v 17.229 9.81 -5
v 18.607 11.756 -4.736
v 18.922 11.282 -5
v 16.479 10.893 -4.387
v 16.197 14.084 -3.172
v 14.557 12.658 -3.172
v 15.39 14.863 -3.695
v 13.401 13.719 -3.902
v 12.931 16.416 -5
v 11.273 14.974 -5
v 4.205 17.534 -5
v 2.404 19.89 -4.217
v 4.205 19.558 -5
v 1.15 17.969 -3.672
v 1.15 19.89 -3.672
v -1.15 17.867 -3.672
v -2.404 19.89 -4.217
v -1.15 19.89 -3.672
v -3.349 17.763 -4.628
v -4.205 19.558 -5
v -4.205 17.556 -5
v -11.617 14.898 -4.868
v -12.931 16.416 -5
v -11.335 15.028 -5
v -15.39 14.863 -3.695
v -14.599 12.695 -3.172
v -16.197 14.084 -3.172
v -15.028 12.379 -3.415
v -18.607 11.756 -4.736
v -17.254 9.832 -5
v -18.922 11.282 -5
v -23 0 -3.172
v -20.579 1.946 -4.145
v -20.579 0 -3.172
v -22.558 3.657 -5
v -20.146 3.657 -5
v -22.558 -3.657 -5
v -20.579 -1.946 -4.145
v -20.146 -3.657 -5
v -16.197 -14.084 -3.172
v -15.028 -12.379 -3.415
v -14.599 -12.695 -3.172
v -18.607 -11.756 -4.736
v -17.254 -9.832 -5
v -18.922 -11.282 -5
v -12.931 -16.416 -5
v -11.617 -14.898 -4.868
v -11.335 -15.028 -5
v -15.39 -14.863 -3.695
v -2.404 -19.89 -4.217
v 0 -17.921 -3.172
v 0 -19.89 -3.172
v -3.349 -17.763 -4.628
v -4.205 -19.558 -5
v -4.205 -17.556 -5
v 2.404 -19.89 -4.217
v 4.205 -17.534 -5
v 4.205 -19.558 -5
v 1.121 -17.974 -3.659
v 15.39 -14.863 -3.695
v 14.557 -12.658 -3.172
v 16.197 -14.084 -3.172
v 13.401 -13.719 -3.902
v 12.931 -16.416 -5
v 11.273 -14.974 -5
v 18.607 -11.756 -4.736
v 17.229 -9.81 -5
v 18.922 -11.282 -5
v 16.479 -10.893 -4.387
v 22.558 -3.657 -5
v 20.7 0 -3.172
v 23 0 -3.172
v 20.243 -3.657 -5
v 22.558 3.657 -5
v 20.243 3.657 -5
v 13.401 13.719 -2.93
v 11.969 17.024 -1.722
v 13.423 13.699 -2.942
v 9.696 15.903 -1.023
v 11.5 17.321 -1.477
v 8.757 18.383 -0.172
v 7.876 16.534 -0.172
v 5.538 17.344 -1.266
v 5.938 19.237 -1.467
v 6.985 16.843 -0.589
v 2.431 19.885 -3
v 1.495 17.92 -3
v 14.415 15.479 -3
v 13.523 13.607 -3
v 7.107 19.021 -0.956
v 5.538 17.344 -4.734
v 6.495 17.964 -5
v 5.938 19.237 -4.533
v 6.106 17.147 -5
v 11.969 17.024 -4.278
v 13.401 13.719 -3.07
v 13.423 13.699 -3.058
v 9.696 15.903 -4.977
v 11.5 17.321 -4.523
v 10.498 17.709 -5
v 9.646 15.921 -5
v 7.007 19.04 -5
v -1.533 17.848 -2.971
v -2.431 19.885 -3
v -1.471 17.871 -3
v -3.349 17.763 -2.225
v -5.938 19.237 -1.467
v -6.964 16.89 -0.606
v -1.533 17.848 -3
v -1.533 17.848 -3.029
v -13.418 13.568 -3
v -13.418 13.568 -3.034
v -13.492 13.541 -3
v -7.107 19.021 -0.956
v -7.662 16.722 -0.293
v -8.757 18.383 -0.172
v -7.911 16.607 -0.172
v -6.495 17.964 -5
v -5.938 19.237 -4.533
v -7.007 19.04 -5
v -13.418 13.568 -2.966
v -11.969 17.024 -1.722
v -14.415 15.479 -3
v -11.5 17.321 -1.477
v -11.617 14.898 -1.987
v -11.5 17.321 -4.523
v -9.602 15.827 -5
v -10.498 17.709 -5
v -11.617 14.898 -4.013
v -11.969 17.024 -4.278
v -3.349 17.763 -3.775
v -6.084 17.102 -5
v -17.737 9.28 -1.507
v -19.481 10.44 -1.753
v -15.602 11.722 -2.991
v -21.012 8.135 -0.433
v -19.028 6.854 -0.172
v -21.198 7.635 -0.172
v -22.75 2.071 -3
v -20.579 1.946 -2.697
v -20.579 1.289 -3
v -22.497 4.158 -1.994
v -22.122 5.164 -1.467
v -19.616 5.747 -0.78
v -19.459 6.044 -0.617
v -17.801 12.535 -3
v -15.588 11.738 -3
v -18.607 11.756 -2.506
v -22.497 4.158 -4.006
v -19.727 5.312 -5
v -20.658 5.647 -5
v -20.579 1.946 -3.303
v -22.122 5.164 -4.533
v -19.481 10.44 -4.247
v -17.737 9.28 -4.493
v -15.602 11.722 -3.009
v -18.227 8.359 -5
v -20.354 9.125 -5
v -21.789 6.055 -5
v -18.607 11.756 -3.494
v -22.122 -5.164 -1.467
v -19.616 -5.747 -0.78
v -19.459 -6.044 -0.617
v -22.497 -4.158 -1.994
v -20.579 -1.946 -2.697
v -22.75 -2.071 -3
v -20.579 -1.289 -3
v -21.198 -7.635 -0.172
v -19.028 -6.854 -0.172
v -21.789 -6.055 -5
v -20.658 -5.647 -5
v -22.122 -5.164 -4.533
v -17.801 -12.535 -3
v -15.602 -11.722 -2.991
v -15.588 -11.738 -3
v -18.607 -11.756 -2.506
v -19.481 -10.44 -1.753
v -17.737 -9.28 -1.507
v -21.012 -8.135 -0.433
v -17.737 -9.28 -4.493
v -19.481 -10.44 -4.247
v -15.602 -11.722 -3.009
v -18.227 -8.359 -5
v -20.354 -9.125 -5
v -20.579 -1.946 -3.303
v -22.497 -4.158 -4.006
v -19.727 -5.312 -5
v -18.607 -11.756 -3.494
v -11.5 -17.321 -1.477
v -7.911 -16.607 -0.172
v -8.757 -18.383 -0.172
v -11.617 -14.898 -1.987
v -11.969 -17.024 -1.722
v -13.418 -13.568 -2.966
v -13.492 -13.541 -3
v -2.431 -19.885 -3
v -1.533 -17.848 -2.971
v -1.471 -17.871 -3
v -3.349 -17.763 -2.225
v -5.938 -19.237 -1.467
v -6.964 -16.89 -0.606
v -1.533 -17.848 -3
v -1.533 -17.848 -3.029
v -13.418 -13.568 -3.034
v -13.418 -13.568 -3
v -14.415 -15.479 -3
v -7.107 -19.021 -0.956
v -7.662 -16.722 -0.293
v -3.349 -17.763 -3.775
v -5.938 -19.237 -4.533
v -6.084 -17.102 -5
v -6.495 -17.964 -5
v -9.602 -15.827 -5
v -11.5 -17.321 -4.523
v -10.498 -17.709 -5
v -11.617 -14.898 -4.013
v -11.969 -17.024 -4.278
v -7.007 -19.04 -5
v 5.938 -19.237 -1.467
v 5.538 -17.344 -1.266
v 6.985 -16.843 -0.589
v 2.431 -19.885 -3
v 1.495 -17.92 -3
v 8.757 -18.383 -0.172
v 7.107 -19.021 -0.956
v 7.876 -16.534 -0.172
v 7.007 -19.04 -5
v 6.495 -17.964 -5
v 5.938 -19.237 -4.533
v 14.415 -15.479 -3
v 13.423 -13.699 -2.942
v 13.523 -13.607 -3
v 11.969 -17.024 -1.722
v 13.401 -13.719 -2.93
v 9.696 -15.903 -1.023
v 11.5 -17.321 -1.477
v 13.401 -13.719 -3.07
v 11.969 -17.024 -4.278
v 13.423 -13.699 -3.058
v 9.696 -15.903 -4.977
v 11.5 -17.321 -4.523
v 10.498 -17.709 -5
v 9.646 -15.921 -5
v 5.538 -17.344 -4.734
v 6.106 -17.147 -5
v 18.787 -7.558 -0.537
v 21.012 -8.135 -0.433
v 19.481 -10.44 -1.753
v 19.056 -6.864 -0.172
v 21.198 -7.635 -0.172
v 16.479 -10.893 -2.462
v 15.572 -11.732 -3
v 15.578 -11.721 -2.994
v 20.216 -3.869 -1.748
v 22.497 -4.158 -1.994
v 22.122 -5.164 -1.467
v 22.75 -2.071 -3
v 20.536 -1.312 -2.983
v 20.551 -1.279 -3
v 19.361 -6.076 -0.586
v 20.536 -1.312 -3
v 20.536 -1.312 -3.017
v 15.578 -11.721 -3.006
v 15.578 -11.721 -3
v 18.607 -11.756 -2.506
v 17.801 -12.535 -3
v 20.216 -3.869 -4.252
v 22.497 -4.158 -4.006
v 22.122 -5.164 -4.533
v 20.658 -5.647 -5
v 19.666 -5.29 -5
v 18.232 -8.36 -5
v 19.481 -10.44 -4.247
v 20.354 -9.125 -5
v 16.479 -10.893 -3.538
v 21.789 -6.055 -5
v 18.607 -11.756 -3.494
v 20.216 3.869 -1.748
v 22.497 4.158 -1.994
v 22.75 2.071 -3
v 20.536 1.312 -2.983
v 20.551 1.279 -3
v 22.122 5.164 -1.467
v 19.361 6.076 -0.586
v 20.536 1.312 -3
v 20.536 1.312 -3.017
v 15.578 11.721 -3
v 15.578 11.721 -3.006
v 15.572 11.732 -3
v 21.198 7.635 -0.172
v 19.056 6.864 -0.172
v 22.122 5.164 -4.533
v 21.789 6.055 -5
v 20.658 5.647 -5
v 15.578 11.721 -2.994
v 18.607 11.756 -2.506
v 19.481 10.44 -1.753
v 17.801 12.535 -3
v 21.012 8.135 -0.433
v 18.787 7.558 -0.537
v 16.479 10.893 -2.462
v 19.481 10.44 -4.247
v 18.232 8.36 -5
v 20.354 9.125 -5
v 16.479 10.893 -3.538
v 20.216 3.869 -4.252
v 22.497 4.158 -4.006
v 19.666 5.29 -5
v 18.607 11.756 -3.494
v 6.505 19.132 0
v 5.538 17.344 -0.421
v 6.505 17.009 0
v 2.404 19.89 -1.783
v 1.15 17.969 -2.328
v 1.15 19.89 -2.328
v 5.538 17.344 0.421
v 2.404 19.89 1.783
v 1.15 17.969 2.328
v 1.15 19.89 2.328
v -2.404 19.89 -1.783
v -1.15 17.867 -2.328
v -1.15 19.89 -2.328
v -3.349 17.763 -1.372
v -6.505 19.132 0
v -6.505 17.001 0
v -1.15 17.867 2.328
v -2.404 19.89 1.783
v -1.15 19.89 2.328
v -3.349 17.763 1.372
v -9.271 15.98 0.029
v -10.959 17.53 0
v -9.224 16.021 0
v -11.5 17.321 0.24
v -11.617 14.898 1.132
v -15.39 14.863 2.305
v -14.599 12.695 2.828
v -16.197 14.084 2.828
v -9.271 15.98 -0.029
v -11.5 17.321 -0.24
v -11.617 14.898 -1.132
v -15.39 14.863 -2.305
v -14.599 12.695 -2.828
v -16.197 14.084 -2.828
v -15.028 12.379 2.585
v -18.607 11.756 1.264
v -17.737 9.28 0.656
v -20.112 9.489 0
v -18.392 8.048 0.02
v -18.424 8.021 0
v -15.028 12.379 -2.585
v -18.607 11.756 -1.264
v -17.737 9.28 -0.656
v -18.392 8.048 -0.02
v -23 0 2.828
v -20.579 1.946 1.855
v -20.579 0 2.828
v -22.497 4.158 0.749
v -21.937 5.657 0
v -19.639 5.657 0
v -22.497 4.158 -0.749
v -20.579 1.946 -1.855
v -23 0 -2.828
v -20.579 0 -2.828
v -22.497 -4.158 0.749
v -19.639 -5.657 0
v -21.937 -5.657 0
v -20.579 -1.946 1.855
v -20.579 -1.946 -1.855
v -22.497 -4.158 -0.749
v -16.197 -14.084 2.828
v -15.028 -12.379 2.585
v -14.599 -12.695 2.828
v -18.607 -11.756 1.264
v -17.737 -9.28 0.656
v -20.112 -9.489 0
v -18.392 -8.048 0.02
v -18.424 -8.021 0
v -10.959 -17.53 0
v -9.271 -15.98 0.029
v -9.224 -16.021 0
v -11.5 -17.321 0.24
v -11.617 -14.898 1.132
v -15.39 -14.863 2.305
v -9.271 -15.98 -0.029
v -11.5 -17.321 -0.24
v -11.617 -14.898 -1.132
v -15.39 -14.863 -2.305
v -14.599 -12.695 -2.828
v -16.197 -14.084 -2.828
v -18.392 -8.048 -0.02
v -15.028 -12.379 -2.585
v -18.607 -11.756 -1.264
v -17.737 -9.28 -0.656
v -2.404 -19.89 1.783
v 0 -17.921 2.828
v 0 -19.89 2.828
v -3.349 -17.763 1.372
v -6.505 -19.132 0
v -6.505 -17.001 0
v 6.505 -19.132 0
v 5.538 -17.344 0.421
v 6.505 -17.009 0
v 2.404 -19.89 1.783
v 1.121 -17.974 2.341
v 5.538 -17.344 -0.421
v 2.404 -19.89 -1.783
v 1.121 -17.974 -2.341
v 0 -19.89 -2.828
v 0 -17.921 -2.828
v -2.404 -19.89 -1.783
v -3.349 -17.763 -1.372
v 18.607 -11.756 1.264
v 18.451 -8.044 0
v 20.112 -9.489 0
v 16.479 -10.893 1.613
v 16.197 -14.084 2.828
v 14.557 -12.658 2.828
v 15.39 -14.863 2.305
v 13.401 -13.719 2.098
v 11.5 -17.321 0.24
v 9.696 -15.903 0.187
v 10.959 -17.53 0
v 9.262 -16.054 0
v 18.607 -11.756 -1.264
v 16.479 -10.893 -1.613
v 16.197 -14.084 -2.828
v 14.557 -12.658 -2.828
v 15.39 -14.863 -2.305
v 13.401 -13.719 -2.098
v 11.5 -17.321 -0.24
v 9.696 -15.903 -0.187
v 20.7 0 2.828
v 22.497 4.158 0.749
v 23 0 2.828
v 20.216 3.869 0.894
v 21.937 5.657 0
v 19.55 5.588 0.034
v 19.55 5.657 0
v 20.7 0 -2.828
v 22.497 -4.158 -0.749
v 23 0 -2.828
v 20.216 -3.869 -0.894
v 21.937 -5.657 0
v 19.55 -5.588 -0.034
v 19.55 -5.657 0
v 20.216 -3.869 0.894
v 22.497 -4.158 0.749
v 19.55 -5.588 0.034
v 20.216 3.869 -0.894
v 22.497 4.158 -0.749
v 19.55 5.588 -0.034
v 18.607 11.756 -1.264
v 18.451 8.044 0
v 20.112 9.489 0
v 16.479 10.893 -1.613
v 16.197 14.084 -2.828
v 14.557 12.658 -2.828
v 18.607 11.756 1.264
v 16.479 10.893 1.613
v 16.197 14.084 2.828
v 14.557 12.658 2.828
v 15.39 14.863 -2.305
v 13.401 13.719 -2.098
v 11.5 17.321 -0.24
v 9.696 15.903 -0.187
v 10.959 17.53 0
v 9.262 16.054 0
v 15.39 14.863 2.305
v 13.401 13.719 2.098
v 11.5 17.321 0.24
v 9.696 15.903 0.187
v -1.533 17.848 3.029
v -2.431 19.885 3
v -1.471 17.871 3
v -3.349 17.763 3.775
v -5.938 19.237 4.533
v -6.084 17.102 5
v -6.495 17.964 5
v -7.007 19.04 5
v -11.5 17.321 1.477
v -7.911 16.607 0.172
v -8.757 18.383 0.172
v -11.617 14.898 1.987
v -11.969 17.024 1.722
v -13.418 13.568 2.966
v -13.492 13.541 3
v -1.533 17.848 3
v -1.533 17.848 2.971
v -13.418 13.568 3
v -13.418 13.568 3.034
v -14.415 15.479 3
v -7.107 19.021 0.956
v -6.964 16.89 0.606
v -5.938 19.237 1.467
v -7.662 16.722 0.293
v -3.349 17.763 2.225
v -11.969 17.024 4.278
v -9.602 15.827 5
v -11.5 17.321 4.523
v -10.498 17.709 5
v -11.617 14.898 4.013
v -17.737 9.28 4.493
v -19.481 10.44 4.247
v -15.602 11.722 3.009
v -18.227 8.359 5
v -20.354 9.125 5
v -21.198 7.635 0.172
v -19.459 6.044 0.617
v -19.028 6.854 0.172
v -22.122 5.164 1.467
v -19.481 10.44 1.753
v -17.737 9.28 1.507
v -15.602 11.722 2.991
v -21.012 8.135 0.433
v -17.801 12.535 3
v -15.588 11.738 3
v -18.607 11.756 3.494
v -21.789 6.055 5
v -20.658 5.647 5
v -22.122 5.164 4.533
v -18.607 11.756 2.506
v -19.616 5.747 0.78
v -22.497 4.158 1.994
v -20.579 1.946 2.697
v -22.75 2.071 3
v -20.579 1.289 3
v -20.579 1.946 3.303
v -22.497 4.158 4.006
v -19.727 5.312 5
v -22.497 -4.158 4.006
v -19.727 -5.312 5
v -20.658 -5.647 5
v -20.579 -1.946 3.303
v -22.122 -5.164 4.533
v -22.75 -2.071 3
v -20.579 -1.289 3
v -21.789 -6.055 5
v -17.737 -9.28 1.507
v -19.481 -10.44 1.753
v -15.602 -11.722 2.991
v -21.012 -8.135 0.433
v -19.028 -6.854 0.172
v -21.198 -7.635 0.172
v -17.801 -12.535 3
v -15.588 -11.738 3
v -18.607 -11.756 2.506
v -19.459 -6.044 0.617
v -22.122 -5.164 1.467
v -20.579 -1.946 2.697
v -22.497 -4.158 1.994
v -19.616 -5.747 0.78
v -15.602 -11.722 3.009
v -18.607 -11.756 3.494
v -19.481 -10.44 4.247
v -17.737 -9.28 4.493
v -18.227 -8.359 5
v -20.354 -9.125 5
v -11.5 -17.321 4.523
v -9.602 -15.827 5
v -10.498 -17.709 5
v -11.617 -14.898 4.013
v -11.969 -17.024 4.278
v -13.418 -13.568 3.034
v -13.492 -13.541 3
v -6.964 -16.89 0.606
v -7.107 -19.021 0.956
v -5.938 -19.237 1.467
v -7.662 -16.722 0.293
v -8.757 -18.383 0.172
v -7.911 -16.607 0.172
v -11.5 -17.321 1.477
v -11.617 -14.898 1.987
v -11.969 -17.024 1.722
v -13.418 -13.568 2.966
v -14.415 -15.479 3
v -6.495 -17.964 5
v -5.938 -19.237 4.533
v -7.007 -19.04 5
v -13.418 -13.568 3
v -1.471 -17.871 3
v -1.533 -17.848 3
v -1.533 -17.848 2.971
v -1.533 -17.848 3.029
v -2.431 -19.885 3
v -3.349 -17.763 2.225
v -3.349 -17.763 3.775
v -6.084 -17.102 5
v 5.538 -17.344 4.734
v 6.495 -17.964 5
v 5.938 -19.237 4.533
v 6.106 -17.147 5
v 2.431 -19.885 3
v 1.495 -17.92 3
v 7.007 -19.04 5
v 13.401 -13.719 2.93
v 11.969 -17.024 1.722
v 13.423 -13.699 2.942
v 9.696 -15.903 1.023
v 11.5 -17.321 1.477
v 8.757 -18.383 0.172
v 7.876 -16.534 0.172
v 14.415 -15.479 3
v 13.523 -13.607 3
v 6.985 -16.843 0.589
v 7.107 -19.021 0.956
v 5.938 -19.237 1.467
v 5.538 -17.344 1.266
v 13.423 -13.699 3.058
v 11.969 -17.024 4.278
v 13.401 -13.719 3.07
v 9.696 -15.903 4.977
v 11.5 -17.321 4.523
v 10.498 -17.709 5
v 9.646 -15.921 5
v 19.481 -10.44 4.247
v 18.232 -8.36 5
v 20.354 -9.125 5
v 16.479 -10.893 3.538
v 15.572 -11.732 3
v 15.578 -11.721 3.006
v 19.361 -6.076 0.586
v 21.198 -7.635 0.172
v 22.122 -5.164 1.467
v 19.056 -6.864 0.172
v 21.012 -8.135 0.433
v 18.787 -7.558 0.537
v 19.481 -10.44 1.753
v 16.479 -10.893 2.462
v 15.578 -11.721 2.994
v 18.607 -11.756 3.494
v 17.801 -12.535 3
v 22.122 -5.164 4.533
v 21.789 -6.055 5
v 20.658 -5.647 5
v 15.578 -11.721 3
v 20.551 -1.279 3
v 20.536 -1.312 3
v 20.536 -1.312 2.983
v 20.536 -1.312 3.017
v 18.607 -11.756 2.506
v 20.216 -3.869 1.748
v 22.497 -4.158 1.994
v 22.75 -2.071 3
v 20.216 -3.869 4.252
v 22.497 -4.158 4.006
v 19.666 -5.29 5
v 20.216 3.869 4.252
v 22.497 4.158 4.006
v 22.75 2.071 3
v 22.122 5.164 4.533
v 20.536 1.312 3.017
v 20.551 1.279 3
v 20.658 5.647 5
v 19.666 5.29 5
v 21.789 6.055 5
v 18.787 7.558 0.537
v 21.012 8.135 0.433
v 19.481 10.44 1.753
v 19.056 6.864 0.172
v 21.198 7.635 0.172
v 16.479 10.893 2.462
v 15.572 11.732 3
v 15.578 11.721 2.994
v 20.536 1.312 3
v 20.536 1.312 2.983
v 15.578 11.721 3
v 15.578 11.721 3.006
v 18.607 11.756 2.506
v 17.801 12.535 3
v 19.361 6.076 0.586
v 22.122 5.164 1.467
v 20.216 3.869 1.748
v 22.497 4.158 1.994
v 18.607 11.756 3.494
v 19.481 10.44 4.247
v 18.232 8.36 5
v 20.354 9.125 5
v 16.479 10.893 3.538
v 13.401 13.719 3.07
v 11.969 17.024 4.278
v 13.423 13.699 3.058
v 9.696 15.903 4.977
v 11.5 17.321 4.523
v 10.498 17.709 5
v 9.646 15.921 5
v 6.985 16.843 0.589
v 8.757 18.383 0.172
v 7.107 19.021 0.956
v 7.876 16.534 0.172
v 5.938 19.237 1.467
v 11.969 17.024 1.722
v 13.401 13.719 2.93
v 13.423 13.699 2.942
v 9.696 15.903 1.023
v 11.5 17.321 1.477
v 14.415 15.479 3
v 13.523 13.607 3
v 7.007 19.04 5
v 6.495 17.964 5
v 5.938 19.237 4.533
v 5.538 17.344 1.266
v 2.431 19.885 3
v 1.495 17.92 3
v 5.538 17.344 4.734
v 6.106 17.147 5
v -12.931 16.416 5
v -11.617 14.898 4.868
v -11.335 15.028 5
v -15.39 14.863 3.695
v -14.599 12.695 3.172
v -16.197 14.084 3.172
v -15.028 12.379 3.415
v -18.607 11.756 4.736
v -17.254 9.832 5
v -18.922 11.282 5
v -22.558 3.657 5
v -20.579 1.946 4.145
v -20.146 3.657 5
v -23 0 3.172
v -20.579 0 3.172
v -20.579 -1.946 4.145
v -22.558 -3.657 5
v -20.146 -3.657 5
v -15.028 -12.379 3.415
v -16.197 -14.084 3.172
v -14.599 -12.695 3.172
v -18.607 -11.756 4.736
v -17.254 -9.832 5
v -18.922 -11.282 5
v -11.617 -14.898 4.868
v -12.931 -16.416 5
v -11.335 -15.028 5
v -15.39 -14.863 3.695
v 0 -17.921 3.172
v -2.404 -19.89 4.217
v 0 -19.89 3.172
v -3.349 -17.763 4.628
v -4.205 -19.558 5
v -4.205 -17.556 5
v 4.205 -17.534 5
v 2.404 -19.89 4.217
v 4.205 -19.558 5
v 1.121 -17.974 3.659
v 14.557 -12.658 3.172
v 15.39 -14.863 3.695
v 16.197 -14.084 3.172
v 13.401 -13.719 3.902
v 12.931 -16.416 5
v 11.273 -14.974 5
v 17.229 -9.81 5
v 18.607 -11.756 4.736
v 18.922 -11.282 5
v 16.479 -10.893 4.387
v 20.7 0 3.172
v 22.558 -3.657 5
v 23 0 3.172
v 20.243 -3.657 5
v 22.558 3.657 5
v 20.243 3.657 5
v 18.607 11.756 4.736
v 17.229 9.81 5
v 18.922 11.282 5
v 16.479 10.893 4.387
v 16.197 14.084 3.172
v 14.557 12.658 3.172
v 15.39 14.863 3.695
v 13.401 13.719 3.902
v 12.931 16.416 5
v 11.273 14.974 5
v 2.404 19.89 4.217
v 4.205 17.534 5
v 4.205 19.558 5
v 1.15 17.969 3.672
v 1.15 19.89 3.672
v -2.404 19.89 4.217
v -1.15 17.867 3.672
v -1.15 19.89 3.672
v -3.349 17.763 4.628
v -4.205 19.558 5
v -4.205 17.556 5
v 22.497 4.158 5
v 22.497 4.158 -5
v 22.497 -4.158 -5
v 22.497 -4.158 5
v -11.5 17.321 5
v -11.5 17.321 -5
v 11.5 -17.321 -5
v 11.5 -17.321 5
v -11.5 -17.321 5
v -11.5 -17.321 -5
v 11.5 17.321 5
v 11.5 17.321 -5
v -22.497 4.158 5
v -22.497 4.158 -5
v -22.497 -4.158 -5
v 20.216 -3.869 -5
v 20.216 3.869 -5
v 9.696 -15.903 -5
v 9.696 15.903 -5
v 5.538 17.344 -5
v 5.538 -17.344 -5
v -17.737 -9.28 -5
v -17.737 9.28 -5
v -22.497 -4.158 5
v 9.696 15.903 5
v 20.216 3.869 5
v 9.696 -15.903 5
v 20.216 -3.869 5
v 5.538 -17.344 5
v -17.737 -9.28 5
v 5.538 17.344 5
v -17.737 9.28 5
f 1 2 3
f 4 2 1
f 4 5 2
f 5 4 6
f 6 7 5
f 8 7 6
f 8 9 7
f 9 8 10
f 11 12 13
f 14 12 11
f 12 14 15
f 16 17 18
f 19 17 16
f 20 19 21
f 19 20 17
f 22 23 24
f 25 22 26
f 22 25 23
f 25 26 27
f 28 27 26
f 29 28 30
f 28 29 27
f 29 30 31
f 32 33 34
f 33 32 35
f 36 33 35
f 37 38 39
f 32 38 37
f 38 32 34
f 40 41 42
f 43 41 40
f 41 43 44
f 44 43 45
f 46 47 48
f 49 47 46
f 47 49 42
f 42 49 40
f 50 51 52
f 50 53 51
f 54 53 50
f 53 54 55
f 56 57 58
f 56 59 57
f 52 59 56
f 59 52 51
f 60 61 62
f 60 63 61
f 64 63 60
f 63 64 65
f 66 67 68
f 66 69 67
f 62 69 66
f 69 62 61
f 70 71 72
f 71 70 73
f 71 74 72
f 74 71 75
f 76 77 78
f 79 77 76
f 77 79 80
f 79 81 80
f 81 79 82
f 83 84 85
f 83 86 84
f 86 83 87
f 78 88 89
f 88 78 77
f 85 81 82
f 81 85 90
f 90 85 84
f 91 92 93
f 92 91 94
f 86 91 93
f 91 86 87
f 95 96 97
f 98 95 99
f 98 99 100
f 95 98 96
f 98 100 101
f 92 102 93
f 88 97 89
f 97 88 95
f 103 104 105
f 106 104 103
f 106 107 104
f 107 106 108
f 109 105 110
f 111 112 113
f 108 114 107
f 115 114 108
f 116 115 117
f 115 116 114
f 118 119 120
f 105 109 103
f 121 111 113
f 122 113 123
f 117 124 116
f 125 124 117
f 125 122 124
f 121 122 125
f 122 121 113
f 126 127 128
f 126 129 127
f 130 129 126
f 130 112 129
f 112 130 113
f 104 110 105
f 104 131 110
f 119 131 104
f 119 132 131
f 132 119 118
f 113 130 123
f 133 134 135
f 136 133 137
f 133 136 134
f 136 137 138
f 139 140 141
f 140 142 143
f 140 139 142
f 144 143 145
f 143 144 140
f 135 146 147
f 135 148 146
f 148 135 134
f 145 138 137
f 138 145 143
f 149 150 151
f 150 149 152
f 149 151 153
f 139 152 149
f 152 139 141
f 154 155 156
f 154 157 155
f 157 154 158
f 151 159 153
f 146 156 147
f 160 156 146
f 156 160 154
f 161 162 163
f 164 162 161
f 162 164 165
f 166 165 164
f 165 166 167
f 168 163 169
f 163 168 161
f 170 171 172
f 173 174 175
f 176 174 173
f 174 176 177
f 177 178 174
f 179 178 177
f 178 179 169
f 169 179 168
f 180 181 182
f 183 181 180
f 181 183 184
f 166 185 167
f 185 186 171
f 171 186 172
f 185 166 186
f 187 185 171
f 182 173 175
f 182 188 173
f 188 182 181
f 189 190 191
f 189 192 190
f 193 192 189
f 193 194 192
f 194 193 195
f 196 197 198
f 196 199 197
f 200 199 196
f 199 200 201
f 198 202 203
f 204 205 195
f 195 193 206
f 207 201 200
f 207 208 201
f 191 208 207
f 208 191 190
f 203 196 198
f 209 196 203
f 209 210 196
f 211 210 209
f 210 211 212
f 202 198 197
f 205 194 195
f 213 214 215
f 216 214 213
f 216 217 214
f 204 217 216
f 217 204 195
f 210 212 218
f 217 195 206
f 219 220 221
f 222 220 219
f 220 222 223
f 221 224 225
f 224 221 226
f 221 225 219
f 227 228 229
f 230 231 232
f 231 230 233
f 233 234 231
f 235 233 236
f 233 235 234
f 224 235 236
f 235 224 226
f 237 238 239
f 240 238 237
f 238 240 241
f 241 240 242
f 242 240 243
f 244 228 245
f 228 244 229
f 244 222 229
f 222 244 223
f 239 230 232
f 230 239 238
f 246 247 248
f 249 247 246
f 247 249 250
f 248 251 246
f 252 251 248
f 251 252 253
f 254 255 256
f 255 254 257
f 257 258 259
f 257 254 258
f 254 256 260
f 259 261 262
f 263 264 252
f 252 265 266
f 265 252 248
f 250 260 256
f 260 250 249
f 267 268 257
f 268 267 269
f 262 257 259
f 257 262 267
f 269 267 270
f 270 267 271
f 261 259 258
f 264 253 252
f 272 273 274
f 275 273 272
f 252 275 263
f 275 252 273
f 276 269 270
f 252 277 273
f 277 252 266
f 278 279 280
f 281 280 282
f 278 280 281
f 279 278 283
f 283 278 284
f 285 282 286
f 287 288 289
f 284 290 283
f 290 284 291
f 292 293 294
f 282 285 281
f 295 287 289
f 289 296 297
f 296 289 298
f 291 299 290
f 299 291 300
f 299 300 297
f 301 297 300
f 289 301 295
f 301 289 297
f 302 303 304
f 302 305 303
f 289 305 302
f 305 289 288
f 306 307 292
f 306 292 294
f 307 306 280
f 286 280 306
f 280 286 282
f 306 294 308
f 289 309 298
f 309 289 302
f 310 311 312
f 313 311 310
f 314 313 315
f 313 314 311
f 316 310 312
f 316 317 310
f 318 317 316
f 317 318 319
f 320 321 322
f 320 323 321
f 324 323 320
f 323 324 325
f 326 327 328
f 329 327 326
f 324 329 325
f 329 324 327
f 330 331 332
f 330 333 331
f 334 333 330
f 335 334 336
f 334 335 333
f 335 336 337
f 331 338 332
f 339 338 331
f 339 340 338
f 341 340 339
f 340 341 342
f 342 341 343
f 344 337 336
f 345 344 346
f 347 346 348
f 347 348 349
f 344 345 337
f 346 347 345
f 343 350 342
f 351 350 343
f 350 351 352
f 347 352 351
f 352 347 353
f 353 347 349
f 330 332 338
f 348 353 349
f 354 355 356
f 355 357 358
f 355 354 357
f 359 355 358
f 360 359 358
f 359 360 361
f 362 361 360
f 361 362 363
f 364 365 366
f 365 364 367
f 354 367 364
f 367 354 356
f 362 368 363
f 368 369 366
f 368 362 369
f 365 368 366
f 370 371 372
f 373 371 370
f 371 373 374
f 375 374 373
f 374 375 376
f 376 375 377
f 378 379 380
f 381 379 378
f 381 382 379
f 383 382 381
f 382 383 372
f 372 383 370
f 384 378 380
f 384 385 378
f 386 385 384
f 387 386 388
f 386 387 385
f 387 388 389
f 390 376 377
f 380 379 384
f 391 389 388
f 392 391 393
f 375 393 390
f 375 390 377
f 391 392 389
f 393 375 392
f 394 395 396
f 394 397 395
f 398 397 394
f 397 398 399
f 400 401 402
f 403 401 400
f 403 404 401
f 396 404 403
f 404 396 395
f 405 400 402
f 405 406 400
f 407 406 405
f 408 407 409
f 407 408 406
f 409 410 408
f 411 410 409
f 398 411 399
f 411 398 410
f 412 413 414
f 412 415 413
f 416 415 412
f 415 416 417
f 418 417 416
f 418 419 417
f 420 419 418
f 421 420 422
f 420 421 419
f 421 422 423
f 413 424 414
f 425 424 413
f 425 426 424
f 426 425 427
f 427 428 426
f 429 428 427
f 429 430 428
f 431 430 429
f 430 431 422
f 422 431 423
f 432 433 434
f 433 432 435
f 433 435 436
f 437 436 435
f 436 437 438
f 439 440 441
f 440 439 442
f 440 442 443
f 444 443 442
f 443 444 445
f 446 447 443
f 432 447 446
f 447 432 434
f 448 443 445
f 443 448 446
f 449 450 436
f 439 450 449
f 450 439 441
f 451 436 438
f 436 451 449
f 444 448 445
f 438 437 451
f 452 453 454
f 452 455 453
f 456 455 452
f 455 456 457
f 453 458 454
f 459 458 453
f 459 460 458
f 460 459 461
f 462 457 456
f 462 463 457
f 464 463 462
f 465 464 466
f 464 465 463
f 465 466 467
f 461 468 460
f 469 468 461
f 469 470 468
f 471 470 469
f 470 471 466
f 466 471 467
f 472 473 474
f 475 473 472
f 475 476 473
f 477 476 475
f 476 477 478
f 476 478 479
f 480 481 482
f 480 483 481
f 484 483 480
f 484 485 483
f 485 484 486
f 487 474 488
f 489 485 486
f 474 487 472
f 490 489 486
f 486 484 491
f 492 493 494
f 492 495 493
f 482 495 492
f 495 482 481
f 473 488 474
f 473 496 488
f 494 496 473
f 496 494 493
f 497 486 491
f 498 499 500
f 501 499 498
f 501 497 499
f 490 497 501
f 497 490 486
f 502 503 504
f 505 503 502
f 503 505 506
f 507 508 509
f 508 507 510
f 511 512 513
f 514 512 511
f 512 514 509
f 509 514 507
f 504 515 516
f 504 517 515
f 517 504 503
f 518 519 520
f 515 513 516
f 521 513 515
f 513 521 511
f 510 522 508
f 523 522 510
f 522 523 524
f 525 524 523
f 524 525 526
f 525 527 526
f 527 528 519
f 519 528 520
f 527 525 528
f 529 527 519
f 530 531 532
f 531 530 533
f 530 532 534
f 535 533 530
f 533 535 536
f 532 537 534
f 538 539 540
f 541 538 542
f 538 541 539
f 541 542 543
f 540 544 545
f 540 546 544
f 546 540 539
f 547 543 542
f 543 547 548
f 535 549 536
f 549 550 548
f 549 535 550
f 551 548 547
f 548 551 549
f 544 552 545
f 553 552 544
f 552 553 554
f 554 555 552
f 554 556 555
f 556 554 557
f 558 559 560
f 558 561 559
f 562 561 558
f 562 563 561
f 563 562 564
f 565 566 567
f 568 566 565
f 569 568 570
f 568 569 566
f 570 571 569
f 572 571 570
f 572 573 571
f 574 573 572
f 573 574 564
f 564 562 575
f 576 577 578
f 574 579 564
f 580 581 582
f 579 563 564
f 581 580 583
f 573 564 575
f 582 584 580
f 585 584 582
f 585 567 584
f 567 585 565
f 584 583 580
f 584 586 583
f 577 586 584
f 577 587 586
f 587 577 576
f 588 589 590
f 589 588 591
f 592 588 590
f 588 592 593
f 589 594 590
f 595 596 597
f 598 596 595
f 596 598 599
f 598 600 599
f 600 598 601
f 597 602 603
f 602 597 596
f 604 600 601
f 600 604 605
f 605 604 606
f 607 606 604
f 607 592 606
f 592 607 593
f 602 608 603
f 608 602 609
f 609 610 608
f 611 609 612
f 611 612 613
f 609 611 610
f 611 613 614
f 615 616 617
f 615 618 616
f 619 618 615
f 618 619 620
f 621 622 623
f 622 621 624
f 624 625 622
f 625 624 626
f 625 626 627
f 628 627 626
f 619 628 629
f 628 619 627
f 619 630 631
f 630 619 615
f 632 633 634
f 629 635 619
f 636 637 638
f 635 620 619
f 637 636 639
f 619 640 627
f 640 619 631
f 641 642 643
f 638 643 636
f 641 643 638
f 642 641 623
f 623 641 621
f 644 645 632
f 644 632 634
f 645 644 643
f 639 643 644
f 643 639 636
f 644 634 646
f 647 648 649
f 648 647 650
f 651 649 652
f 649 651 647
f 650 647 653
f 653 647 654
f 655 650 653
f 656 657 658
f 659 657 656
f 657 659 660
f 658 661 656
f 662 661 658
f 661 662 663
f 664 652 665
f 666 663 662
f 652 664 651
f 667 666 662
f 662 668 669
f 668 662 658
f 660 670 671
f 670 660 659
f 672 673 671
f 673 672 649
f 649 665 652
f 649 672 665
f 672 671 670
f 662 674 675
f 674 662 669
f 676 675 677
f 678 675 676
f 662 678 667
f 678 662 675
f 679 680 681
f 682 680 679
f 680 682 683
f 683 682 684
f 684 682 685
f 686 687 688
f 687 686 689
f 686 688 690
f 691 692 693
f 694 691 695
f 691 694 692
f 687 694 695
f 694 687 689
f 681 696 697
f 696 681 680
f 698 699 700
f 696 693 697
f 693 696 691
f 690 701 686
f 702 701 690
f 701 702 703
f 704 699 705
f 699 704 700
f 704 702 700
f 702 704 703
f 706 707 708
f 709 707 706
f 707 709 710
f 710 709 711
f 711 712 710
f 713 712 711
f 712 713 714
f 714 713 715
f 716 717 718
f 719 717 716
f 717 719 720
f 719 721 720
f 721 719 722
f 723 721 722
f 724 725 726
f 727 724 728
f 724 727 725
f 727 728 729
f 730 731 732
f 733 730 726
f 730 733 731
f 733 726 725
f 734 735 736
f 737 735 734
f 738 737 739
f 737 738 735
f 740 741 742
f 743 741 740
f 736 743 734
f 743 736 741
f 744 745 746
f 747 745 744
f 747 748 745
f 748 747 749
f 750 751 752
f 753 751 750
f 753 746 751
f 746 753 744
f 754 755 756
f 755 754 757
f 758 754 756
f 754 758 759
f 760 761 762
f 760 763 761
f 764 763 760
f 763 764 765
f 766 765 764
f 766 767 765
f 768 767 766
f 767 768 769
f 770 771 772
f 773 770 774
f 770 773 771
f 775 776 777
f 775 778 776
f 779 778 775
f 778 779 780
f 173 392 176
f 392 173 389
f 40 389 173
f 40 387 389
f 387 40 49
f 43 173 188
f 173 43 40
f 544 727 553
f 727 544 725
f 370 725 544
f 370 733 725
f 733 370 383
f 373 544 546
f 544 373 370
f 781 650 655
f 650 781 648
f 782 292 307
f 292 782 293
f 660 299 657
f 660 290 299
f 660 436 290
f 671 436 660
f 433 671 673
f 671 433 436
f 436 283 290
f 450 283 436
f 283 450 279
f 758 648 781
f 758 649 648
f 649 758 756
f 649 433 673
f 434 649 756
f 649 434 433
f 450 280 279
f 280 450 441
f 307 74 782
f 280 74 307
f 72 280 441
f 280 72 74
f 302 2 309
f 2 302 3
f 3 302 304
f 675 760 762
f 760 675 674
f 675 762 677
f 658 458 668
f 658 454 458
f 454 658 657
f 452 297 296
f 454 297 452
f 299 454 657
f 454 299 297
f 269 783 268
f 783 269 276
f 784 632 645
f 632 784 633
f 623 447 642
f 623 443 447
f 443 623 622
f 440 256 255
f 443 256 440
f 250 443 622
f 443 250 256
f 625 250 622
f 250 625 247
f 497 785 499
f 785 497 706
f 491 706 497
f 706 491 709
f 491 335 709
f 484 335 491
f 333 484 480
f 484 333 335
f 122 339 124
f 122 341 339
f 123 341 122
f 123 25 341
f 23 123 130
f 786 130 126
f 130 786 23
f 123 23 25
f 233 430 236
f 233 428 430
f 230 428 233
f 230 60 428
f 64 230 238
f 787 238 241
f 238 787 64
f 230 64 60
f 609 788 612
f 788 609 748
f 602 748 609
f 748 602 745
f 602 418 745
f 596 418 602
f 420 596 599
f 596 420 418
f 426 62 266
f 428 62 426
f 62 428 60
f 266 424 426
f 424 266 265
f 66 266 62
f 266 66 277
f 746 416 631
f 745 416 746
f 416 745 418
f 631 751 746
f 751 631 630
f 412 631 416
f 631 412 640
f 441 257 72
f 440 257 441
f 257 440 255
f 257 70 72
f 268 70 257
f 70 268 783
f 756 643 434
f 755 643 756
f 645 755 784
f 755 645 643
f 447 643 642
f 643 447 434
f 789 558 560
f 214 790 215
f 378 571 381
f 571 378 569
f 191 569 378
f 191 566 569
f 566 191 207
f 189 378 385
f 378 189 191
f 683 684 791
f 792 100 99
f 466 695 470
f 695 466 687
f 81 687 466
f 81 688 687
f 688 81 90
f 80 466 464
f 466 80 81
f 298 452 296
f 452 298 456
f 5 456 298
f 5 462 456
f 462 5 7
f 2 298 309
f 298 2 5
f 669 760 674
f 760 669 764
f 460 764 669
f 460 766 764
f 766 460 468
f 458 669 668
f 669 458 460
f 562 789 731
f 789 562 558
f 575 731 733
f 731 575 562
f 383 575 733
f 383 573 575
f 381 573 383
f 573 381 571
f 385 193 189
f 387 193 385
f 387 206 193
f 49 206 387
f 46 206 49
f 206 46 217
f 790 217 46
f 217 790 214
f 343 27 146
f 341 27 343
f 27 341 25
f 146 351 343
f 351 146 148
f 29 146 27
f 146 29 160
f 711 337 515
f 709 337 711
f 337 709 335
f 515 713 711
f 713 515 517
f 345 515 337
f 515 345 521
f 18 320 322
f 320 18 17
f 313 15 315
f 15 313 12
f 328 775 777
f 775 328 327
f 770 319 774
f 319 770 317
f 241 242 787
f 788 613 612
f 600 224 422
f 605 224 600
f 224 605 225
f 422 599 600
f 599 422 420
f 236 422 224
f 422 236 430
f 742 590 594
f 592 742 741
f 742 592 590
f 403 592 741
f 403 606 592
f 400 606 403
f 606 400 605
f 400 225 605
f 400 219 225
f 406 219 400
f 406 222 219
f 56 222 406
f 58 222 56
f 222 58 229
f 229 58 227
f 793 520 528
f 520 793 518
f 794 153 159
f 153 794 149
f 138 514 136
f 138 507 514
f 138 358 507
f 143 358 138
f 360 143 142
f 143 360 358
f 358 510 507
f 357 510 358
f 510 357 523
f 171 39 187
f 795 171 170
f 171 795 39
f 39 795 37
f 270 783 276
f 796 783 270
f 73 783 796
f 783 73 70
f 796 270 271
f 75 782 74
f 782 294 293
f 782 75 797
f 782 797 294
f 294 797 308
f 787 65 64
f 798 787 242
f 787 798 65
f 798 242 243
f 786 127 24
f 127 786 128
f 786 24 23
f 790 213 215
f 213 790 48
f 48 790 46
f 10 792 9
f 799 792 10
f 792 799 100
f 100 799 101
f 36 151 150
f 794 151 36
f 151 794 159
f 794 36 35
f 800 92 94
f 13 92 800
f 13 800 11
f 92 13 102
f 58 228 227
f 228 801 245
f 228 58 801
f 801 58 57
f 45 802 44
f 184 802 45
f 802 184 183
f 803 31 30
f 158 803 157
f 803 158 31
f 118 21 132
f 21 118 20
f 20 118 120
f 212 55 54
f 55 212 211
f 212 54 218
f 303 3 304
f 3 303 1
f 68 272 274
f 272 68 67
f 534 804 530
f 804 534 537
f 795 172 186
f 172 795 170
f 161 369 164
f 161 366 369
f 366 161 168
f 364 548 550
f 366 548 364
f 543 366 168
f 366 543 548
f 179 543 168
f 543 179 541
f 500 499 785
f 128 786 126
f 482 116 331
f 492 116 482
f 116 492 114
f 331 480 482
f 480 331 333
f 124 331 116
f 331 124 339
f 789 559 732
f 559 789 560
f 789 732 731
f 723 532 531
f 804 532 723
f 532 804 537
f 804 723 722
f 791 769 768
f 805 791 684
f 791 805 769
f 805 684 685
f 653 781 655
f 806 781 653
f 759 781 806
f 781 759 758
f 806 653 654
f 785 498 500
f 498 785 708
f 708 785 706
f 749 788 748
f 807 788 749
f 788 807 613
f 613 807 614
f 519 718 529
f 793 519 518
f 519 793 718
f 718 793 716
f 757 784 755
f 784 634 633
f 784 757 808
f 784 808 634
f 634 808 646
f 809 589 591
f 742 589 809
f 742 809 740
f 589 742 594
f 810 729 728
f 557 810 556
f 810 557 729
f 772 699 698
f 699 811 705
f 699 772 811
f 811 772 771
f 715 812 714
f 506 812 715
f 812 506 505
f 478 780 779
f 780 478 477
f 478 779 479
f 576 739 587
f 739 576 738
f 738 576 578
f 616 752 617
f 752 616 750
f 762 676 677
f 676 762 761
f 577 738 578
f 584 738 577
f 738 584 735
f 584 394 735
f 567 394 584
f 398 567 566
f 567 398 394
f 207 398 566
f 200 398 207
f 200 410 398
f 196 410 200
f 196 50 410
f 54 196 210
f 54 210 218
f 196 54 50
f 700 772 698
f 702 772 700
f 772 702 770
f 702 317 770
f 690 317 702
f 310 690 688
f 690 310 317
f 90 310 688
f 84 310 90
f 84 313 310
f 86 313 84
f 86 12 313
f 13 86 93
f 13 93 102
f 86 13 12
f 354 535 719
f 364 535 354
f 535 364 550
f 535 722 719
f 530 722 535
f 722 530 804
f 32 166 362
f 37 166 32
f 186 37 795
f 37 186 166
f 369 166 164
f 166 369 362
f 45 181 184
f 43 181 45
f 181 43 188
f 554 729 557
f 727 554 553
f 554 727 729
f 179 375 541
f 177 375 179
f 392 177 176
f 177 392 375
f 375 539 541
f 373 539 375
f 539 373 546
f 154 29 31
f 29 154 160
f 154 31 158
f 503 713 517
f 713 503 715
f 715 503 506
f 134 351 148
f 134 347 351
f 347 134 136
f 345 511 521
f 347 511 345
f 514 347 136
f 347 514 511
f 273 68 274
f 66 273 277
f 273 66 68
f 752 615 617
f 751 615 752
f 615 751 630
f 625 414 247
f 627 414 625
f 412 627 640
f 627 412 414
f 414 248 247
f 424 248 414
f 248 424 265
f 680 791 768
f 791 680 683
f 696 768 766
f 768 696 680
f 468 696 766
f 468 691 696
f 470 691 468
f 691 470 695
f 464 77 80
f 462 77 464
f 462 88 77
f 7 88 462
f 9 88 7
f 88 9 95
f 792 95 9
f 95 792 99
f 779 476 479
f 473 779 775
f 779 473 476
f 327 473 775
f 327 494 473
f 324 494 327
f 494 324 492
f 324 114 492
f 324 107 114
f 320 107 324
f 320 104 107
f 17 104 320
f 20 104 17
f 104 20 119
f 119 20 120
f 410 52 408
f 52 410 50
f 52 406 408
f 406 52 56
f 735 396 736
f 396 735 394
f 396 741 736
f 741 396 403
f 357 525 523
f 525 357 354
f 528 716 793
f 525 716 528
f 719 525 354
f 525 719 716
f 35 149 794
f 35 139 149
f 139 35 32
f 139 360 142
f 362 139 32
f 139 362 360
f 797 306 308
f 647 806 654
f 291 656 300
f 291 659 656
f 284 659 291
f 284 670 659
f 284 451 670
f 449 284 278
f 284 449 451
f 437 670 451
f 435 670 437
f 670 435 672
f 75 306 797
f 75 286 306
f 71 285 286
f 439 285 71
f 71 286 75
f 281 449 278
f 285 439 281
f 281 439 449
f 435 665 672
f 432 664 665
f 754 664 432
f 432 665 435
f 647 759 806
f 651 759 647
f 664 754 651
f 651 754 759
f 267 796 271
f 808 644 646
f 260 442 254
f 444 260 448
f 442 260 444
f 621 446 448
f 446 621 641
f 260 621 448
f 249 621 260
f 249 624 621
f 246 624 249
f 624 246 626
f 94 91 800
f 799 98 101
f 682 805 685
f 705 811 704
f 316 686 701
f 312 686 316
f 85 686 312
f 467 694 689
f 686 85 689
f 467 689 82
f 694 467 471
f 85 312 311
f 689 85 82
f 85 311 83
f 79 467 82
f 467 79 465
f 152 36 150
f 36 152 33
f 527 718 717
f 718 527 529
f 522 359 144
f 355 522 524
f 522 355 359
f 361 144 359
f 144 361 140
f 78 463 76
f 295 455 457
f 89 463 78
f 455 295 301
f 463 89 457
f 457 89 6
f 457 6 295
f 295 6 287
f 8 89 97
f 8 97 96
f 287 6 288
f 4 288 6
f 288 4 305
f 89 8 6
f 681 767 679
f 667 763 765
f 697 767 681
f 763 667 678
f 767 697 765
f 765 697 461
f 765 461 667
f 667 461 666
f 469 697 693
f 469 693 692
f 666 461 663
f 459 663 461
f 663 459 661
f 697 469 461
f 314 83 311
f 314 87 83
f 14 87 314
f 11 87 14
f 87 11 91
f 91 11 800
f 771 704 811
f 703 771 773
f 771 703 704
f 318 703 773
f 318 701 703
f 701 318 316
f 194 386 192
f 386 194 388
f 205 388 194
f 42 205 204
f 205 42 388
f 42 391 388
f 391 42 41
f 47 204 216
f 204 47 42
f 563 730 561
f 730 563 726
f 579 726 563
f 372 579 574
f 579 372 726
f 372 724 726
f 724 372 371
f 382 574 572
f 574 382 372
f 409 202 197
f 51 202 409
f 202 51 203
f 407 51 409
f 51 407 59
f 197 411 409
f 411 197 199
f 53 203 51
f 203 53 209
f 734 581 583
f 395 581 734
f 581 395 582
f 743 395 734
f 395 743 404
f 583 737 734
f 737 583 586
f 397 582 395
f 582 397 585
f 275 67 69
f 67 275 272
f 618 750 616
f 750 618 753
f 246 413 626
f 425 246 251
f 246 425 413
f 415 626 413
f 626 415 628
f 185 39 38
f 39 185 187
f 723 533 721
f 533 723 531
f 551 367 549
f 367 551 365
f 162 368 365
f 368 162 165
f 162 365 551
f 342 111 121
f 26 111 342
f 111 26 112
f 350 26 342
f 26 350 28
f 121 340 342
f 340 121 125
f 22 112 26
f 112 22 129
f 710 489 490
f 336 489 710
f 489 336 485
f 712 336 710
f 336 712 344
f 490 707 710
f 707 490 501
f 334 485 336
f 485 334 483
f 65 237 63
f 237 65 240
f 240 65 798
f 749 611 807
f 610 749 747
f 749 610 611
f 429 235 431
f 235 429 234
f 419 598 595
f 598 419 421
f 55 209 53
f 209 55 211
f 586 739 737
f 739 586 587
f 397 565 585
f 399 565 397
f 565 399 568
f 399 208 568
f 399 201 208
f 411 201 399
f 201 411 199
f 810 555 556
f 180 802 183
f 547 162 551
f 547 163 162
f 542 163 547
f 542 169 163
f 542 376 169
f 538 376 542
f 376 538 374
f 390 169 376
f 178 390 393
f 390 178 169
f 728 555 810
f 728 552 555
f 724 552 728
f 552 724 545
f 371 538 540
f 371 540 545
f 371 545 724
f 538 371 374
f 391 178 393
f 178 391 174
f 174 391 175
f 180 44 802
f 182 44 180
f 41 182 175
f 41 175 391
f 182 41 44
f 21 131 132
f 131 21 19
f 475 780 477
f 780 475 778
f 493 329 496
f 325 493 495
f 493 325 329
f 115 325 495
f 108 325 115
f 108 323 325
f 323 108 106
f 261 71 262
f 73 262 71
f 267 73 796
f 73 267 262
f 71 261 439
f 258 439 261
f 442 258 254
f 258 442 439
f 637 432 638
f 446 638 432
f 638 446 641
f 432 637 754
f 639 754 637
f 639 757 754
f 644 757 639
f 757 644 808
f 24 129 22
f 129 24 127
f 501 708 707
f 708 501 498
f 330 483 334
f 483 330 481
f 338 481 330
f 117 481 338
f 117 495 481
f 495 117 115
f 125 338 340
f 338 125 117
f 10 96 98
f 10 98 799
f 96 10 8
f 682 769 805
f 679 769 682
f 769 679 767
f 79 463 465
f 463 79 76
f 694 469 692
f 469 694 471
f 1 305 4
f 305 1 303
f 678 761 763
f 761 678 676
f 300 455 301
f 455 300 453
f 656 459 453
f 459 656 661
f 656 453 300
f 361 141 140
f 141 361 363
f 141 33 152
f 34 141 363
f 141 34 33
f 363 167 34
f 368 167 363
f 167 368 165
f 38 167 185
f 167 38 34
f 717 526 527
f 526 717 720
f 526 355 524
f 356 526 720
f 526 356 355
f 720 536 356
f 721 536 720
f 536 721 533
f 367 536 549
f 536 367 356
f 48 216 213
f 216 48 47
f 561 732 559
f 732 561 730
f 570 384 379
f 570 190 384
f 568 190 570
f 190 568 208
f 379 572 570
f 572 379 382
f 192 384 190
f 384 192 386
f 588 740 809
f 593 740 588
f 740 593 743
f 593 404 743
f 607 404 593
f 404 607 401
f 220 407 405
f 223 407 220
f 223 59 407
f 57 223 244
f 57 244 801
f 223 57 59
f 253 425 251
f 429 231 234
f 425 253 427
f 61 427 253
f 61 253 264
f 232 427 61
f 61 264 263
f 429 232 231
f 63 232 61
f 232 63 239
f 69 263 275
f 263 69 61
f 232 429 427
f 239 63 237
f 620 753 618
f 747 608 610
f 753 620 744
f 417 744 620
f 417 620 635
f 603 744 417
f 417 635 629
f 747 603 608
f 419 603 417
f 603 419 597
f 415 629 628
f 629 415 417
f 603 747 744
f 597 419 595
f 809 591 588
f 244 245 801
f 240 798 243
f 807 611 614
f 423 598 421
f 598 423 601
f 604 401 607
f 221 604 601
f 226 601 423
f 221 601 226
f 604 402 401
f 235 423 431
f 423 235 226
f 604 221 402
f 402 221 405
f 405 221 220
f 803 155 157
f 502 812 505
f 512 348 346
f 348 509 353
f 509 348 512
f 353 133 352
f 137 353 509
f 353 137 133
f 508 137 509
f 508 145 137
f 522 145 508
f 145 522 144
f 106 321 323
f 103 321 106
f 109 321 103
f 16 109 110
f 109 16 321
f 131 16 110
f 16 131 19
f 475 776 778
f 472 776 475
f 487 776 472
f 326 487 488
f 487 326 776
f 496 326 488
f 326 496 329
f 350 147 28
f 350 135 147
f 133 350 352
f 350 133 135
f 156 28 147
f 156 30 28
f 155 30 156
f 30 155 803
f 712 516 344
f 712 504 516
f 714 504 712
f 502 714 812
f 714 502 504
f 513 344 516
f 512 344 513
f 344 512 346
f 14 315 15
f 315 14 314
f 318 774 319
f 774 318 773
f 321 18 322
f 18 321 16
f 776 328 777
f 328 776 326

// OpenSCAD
/**/


scale([2.3,2,1]){

difference(){

cylinder(h = 10, r1 = 10, r2 = 10, center=true){
    
}

cylinder(h = 10, r1 = 9, r2 = 9, center=true){
    
}

translate([0,10,0]){
cube([/*9*/1,3,10],true){
}
}


for (level = [-2:1:2]) {
    
    
for (rotation = [0:45:360]) {
rotate([0,0,rotation+level*22.5]){
translate([0,10,level*3]){
rotate([0,45,0]){
cube([4,3,4],true){
}
}
}
}
}


}


}

}
/**/














/*
cube([20,10,3],true){


}

translate([10,0,0]){
    cube([5,15,3],true){


    }
}
*/
